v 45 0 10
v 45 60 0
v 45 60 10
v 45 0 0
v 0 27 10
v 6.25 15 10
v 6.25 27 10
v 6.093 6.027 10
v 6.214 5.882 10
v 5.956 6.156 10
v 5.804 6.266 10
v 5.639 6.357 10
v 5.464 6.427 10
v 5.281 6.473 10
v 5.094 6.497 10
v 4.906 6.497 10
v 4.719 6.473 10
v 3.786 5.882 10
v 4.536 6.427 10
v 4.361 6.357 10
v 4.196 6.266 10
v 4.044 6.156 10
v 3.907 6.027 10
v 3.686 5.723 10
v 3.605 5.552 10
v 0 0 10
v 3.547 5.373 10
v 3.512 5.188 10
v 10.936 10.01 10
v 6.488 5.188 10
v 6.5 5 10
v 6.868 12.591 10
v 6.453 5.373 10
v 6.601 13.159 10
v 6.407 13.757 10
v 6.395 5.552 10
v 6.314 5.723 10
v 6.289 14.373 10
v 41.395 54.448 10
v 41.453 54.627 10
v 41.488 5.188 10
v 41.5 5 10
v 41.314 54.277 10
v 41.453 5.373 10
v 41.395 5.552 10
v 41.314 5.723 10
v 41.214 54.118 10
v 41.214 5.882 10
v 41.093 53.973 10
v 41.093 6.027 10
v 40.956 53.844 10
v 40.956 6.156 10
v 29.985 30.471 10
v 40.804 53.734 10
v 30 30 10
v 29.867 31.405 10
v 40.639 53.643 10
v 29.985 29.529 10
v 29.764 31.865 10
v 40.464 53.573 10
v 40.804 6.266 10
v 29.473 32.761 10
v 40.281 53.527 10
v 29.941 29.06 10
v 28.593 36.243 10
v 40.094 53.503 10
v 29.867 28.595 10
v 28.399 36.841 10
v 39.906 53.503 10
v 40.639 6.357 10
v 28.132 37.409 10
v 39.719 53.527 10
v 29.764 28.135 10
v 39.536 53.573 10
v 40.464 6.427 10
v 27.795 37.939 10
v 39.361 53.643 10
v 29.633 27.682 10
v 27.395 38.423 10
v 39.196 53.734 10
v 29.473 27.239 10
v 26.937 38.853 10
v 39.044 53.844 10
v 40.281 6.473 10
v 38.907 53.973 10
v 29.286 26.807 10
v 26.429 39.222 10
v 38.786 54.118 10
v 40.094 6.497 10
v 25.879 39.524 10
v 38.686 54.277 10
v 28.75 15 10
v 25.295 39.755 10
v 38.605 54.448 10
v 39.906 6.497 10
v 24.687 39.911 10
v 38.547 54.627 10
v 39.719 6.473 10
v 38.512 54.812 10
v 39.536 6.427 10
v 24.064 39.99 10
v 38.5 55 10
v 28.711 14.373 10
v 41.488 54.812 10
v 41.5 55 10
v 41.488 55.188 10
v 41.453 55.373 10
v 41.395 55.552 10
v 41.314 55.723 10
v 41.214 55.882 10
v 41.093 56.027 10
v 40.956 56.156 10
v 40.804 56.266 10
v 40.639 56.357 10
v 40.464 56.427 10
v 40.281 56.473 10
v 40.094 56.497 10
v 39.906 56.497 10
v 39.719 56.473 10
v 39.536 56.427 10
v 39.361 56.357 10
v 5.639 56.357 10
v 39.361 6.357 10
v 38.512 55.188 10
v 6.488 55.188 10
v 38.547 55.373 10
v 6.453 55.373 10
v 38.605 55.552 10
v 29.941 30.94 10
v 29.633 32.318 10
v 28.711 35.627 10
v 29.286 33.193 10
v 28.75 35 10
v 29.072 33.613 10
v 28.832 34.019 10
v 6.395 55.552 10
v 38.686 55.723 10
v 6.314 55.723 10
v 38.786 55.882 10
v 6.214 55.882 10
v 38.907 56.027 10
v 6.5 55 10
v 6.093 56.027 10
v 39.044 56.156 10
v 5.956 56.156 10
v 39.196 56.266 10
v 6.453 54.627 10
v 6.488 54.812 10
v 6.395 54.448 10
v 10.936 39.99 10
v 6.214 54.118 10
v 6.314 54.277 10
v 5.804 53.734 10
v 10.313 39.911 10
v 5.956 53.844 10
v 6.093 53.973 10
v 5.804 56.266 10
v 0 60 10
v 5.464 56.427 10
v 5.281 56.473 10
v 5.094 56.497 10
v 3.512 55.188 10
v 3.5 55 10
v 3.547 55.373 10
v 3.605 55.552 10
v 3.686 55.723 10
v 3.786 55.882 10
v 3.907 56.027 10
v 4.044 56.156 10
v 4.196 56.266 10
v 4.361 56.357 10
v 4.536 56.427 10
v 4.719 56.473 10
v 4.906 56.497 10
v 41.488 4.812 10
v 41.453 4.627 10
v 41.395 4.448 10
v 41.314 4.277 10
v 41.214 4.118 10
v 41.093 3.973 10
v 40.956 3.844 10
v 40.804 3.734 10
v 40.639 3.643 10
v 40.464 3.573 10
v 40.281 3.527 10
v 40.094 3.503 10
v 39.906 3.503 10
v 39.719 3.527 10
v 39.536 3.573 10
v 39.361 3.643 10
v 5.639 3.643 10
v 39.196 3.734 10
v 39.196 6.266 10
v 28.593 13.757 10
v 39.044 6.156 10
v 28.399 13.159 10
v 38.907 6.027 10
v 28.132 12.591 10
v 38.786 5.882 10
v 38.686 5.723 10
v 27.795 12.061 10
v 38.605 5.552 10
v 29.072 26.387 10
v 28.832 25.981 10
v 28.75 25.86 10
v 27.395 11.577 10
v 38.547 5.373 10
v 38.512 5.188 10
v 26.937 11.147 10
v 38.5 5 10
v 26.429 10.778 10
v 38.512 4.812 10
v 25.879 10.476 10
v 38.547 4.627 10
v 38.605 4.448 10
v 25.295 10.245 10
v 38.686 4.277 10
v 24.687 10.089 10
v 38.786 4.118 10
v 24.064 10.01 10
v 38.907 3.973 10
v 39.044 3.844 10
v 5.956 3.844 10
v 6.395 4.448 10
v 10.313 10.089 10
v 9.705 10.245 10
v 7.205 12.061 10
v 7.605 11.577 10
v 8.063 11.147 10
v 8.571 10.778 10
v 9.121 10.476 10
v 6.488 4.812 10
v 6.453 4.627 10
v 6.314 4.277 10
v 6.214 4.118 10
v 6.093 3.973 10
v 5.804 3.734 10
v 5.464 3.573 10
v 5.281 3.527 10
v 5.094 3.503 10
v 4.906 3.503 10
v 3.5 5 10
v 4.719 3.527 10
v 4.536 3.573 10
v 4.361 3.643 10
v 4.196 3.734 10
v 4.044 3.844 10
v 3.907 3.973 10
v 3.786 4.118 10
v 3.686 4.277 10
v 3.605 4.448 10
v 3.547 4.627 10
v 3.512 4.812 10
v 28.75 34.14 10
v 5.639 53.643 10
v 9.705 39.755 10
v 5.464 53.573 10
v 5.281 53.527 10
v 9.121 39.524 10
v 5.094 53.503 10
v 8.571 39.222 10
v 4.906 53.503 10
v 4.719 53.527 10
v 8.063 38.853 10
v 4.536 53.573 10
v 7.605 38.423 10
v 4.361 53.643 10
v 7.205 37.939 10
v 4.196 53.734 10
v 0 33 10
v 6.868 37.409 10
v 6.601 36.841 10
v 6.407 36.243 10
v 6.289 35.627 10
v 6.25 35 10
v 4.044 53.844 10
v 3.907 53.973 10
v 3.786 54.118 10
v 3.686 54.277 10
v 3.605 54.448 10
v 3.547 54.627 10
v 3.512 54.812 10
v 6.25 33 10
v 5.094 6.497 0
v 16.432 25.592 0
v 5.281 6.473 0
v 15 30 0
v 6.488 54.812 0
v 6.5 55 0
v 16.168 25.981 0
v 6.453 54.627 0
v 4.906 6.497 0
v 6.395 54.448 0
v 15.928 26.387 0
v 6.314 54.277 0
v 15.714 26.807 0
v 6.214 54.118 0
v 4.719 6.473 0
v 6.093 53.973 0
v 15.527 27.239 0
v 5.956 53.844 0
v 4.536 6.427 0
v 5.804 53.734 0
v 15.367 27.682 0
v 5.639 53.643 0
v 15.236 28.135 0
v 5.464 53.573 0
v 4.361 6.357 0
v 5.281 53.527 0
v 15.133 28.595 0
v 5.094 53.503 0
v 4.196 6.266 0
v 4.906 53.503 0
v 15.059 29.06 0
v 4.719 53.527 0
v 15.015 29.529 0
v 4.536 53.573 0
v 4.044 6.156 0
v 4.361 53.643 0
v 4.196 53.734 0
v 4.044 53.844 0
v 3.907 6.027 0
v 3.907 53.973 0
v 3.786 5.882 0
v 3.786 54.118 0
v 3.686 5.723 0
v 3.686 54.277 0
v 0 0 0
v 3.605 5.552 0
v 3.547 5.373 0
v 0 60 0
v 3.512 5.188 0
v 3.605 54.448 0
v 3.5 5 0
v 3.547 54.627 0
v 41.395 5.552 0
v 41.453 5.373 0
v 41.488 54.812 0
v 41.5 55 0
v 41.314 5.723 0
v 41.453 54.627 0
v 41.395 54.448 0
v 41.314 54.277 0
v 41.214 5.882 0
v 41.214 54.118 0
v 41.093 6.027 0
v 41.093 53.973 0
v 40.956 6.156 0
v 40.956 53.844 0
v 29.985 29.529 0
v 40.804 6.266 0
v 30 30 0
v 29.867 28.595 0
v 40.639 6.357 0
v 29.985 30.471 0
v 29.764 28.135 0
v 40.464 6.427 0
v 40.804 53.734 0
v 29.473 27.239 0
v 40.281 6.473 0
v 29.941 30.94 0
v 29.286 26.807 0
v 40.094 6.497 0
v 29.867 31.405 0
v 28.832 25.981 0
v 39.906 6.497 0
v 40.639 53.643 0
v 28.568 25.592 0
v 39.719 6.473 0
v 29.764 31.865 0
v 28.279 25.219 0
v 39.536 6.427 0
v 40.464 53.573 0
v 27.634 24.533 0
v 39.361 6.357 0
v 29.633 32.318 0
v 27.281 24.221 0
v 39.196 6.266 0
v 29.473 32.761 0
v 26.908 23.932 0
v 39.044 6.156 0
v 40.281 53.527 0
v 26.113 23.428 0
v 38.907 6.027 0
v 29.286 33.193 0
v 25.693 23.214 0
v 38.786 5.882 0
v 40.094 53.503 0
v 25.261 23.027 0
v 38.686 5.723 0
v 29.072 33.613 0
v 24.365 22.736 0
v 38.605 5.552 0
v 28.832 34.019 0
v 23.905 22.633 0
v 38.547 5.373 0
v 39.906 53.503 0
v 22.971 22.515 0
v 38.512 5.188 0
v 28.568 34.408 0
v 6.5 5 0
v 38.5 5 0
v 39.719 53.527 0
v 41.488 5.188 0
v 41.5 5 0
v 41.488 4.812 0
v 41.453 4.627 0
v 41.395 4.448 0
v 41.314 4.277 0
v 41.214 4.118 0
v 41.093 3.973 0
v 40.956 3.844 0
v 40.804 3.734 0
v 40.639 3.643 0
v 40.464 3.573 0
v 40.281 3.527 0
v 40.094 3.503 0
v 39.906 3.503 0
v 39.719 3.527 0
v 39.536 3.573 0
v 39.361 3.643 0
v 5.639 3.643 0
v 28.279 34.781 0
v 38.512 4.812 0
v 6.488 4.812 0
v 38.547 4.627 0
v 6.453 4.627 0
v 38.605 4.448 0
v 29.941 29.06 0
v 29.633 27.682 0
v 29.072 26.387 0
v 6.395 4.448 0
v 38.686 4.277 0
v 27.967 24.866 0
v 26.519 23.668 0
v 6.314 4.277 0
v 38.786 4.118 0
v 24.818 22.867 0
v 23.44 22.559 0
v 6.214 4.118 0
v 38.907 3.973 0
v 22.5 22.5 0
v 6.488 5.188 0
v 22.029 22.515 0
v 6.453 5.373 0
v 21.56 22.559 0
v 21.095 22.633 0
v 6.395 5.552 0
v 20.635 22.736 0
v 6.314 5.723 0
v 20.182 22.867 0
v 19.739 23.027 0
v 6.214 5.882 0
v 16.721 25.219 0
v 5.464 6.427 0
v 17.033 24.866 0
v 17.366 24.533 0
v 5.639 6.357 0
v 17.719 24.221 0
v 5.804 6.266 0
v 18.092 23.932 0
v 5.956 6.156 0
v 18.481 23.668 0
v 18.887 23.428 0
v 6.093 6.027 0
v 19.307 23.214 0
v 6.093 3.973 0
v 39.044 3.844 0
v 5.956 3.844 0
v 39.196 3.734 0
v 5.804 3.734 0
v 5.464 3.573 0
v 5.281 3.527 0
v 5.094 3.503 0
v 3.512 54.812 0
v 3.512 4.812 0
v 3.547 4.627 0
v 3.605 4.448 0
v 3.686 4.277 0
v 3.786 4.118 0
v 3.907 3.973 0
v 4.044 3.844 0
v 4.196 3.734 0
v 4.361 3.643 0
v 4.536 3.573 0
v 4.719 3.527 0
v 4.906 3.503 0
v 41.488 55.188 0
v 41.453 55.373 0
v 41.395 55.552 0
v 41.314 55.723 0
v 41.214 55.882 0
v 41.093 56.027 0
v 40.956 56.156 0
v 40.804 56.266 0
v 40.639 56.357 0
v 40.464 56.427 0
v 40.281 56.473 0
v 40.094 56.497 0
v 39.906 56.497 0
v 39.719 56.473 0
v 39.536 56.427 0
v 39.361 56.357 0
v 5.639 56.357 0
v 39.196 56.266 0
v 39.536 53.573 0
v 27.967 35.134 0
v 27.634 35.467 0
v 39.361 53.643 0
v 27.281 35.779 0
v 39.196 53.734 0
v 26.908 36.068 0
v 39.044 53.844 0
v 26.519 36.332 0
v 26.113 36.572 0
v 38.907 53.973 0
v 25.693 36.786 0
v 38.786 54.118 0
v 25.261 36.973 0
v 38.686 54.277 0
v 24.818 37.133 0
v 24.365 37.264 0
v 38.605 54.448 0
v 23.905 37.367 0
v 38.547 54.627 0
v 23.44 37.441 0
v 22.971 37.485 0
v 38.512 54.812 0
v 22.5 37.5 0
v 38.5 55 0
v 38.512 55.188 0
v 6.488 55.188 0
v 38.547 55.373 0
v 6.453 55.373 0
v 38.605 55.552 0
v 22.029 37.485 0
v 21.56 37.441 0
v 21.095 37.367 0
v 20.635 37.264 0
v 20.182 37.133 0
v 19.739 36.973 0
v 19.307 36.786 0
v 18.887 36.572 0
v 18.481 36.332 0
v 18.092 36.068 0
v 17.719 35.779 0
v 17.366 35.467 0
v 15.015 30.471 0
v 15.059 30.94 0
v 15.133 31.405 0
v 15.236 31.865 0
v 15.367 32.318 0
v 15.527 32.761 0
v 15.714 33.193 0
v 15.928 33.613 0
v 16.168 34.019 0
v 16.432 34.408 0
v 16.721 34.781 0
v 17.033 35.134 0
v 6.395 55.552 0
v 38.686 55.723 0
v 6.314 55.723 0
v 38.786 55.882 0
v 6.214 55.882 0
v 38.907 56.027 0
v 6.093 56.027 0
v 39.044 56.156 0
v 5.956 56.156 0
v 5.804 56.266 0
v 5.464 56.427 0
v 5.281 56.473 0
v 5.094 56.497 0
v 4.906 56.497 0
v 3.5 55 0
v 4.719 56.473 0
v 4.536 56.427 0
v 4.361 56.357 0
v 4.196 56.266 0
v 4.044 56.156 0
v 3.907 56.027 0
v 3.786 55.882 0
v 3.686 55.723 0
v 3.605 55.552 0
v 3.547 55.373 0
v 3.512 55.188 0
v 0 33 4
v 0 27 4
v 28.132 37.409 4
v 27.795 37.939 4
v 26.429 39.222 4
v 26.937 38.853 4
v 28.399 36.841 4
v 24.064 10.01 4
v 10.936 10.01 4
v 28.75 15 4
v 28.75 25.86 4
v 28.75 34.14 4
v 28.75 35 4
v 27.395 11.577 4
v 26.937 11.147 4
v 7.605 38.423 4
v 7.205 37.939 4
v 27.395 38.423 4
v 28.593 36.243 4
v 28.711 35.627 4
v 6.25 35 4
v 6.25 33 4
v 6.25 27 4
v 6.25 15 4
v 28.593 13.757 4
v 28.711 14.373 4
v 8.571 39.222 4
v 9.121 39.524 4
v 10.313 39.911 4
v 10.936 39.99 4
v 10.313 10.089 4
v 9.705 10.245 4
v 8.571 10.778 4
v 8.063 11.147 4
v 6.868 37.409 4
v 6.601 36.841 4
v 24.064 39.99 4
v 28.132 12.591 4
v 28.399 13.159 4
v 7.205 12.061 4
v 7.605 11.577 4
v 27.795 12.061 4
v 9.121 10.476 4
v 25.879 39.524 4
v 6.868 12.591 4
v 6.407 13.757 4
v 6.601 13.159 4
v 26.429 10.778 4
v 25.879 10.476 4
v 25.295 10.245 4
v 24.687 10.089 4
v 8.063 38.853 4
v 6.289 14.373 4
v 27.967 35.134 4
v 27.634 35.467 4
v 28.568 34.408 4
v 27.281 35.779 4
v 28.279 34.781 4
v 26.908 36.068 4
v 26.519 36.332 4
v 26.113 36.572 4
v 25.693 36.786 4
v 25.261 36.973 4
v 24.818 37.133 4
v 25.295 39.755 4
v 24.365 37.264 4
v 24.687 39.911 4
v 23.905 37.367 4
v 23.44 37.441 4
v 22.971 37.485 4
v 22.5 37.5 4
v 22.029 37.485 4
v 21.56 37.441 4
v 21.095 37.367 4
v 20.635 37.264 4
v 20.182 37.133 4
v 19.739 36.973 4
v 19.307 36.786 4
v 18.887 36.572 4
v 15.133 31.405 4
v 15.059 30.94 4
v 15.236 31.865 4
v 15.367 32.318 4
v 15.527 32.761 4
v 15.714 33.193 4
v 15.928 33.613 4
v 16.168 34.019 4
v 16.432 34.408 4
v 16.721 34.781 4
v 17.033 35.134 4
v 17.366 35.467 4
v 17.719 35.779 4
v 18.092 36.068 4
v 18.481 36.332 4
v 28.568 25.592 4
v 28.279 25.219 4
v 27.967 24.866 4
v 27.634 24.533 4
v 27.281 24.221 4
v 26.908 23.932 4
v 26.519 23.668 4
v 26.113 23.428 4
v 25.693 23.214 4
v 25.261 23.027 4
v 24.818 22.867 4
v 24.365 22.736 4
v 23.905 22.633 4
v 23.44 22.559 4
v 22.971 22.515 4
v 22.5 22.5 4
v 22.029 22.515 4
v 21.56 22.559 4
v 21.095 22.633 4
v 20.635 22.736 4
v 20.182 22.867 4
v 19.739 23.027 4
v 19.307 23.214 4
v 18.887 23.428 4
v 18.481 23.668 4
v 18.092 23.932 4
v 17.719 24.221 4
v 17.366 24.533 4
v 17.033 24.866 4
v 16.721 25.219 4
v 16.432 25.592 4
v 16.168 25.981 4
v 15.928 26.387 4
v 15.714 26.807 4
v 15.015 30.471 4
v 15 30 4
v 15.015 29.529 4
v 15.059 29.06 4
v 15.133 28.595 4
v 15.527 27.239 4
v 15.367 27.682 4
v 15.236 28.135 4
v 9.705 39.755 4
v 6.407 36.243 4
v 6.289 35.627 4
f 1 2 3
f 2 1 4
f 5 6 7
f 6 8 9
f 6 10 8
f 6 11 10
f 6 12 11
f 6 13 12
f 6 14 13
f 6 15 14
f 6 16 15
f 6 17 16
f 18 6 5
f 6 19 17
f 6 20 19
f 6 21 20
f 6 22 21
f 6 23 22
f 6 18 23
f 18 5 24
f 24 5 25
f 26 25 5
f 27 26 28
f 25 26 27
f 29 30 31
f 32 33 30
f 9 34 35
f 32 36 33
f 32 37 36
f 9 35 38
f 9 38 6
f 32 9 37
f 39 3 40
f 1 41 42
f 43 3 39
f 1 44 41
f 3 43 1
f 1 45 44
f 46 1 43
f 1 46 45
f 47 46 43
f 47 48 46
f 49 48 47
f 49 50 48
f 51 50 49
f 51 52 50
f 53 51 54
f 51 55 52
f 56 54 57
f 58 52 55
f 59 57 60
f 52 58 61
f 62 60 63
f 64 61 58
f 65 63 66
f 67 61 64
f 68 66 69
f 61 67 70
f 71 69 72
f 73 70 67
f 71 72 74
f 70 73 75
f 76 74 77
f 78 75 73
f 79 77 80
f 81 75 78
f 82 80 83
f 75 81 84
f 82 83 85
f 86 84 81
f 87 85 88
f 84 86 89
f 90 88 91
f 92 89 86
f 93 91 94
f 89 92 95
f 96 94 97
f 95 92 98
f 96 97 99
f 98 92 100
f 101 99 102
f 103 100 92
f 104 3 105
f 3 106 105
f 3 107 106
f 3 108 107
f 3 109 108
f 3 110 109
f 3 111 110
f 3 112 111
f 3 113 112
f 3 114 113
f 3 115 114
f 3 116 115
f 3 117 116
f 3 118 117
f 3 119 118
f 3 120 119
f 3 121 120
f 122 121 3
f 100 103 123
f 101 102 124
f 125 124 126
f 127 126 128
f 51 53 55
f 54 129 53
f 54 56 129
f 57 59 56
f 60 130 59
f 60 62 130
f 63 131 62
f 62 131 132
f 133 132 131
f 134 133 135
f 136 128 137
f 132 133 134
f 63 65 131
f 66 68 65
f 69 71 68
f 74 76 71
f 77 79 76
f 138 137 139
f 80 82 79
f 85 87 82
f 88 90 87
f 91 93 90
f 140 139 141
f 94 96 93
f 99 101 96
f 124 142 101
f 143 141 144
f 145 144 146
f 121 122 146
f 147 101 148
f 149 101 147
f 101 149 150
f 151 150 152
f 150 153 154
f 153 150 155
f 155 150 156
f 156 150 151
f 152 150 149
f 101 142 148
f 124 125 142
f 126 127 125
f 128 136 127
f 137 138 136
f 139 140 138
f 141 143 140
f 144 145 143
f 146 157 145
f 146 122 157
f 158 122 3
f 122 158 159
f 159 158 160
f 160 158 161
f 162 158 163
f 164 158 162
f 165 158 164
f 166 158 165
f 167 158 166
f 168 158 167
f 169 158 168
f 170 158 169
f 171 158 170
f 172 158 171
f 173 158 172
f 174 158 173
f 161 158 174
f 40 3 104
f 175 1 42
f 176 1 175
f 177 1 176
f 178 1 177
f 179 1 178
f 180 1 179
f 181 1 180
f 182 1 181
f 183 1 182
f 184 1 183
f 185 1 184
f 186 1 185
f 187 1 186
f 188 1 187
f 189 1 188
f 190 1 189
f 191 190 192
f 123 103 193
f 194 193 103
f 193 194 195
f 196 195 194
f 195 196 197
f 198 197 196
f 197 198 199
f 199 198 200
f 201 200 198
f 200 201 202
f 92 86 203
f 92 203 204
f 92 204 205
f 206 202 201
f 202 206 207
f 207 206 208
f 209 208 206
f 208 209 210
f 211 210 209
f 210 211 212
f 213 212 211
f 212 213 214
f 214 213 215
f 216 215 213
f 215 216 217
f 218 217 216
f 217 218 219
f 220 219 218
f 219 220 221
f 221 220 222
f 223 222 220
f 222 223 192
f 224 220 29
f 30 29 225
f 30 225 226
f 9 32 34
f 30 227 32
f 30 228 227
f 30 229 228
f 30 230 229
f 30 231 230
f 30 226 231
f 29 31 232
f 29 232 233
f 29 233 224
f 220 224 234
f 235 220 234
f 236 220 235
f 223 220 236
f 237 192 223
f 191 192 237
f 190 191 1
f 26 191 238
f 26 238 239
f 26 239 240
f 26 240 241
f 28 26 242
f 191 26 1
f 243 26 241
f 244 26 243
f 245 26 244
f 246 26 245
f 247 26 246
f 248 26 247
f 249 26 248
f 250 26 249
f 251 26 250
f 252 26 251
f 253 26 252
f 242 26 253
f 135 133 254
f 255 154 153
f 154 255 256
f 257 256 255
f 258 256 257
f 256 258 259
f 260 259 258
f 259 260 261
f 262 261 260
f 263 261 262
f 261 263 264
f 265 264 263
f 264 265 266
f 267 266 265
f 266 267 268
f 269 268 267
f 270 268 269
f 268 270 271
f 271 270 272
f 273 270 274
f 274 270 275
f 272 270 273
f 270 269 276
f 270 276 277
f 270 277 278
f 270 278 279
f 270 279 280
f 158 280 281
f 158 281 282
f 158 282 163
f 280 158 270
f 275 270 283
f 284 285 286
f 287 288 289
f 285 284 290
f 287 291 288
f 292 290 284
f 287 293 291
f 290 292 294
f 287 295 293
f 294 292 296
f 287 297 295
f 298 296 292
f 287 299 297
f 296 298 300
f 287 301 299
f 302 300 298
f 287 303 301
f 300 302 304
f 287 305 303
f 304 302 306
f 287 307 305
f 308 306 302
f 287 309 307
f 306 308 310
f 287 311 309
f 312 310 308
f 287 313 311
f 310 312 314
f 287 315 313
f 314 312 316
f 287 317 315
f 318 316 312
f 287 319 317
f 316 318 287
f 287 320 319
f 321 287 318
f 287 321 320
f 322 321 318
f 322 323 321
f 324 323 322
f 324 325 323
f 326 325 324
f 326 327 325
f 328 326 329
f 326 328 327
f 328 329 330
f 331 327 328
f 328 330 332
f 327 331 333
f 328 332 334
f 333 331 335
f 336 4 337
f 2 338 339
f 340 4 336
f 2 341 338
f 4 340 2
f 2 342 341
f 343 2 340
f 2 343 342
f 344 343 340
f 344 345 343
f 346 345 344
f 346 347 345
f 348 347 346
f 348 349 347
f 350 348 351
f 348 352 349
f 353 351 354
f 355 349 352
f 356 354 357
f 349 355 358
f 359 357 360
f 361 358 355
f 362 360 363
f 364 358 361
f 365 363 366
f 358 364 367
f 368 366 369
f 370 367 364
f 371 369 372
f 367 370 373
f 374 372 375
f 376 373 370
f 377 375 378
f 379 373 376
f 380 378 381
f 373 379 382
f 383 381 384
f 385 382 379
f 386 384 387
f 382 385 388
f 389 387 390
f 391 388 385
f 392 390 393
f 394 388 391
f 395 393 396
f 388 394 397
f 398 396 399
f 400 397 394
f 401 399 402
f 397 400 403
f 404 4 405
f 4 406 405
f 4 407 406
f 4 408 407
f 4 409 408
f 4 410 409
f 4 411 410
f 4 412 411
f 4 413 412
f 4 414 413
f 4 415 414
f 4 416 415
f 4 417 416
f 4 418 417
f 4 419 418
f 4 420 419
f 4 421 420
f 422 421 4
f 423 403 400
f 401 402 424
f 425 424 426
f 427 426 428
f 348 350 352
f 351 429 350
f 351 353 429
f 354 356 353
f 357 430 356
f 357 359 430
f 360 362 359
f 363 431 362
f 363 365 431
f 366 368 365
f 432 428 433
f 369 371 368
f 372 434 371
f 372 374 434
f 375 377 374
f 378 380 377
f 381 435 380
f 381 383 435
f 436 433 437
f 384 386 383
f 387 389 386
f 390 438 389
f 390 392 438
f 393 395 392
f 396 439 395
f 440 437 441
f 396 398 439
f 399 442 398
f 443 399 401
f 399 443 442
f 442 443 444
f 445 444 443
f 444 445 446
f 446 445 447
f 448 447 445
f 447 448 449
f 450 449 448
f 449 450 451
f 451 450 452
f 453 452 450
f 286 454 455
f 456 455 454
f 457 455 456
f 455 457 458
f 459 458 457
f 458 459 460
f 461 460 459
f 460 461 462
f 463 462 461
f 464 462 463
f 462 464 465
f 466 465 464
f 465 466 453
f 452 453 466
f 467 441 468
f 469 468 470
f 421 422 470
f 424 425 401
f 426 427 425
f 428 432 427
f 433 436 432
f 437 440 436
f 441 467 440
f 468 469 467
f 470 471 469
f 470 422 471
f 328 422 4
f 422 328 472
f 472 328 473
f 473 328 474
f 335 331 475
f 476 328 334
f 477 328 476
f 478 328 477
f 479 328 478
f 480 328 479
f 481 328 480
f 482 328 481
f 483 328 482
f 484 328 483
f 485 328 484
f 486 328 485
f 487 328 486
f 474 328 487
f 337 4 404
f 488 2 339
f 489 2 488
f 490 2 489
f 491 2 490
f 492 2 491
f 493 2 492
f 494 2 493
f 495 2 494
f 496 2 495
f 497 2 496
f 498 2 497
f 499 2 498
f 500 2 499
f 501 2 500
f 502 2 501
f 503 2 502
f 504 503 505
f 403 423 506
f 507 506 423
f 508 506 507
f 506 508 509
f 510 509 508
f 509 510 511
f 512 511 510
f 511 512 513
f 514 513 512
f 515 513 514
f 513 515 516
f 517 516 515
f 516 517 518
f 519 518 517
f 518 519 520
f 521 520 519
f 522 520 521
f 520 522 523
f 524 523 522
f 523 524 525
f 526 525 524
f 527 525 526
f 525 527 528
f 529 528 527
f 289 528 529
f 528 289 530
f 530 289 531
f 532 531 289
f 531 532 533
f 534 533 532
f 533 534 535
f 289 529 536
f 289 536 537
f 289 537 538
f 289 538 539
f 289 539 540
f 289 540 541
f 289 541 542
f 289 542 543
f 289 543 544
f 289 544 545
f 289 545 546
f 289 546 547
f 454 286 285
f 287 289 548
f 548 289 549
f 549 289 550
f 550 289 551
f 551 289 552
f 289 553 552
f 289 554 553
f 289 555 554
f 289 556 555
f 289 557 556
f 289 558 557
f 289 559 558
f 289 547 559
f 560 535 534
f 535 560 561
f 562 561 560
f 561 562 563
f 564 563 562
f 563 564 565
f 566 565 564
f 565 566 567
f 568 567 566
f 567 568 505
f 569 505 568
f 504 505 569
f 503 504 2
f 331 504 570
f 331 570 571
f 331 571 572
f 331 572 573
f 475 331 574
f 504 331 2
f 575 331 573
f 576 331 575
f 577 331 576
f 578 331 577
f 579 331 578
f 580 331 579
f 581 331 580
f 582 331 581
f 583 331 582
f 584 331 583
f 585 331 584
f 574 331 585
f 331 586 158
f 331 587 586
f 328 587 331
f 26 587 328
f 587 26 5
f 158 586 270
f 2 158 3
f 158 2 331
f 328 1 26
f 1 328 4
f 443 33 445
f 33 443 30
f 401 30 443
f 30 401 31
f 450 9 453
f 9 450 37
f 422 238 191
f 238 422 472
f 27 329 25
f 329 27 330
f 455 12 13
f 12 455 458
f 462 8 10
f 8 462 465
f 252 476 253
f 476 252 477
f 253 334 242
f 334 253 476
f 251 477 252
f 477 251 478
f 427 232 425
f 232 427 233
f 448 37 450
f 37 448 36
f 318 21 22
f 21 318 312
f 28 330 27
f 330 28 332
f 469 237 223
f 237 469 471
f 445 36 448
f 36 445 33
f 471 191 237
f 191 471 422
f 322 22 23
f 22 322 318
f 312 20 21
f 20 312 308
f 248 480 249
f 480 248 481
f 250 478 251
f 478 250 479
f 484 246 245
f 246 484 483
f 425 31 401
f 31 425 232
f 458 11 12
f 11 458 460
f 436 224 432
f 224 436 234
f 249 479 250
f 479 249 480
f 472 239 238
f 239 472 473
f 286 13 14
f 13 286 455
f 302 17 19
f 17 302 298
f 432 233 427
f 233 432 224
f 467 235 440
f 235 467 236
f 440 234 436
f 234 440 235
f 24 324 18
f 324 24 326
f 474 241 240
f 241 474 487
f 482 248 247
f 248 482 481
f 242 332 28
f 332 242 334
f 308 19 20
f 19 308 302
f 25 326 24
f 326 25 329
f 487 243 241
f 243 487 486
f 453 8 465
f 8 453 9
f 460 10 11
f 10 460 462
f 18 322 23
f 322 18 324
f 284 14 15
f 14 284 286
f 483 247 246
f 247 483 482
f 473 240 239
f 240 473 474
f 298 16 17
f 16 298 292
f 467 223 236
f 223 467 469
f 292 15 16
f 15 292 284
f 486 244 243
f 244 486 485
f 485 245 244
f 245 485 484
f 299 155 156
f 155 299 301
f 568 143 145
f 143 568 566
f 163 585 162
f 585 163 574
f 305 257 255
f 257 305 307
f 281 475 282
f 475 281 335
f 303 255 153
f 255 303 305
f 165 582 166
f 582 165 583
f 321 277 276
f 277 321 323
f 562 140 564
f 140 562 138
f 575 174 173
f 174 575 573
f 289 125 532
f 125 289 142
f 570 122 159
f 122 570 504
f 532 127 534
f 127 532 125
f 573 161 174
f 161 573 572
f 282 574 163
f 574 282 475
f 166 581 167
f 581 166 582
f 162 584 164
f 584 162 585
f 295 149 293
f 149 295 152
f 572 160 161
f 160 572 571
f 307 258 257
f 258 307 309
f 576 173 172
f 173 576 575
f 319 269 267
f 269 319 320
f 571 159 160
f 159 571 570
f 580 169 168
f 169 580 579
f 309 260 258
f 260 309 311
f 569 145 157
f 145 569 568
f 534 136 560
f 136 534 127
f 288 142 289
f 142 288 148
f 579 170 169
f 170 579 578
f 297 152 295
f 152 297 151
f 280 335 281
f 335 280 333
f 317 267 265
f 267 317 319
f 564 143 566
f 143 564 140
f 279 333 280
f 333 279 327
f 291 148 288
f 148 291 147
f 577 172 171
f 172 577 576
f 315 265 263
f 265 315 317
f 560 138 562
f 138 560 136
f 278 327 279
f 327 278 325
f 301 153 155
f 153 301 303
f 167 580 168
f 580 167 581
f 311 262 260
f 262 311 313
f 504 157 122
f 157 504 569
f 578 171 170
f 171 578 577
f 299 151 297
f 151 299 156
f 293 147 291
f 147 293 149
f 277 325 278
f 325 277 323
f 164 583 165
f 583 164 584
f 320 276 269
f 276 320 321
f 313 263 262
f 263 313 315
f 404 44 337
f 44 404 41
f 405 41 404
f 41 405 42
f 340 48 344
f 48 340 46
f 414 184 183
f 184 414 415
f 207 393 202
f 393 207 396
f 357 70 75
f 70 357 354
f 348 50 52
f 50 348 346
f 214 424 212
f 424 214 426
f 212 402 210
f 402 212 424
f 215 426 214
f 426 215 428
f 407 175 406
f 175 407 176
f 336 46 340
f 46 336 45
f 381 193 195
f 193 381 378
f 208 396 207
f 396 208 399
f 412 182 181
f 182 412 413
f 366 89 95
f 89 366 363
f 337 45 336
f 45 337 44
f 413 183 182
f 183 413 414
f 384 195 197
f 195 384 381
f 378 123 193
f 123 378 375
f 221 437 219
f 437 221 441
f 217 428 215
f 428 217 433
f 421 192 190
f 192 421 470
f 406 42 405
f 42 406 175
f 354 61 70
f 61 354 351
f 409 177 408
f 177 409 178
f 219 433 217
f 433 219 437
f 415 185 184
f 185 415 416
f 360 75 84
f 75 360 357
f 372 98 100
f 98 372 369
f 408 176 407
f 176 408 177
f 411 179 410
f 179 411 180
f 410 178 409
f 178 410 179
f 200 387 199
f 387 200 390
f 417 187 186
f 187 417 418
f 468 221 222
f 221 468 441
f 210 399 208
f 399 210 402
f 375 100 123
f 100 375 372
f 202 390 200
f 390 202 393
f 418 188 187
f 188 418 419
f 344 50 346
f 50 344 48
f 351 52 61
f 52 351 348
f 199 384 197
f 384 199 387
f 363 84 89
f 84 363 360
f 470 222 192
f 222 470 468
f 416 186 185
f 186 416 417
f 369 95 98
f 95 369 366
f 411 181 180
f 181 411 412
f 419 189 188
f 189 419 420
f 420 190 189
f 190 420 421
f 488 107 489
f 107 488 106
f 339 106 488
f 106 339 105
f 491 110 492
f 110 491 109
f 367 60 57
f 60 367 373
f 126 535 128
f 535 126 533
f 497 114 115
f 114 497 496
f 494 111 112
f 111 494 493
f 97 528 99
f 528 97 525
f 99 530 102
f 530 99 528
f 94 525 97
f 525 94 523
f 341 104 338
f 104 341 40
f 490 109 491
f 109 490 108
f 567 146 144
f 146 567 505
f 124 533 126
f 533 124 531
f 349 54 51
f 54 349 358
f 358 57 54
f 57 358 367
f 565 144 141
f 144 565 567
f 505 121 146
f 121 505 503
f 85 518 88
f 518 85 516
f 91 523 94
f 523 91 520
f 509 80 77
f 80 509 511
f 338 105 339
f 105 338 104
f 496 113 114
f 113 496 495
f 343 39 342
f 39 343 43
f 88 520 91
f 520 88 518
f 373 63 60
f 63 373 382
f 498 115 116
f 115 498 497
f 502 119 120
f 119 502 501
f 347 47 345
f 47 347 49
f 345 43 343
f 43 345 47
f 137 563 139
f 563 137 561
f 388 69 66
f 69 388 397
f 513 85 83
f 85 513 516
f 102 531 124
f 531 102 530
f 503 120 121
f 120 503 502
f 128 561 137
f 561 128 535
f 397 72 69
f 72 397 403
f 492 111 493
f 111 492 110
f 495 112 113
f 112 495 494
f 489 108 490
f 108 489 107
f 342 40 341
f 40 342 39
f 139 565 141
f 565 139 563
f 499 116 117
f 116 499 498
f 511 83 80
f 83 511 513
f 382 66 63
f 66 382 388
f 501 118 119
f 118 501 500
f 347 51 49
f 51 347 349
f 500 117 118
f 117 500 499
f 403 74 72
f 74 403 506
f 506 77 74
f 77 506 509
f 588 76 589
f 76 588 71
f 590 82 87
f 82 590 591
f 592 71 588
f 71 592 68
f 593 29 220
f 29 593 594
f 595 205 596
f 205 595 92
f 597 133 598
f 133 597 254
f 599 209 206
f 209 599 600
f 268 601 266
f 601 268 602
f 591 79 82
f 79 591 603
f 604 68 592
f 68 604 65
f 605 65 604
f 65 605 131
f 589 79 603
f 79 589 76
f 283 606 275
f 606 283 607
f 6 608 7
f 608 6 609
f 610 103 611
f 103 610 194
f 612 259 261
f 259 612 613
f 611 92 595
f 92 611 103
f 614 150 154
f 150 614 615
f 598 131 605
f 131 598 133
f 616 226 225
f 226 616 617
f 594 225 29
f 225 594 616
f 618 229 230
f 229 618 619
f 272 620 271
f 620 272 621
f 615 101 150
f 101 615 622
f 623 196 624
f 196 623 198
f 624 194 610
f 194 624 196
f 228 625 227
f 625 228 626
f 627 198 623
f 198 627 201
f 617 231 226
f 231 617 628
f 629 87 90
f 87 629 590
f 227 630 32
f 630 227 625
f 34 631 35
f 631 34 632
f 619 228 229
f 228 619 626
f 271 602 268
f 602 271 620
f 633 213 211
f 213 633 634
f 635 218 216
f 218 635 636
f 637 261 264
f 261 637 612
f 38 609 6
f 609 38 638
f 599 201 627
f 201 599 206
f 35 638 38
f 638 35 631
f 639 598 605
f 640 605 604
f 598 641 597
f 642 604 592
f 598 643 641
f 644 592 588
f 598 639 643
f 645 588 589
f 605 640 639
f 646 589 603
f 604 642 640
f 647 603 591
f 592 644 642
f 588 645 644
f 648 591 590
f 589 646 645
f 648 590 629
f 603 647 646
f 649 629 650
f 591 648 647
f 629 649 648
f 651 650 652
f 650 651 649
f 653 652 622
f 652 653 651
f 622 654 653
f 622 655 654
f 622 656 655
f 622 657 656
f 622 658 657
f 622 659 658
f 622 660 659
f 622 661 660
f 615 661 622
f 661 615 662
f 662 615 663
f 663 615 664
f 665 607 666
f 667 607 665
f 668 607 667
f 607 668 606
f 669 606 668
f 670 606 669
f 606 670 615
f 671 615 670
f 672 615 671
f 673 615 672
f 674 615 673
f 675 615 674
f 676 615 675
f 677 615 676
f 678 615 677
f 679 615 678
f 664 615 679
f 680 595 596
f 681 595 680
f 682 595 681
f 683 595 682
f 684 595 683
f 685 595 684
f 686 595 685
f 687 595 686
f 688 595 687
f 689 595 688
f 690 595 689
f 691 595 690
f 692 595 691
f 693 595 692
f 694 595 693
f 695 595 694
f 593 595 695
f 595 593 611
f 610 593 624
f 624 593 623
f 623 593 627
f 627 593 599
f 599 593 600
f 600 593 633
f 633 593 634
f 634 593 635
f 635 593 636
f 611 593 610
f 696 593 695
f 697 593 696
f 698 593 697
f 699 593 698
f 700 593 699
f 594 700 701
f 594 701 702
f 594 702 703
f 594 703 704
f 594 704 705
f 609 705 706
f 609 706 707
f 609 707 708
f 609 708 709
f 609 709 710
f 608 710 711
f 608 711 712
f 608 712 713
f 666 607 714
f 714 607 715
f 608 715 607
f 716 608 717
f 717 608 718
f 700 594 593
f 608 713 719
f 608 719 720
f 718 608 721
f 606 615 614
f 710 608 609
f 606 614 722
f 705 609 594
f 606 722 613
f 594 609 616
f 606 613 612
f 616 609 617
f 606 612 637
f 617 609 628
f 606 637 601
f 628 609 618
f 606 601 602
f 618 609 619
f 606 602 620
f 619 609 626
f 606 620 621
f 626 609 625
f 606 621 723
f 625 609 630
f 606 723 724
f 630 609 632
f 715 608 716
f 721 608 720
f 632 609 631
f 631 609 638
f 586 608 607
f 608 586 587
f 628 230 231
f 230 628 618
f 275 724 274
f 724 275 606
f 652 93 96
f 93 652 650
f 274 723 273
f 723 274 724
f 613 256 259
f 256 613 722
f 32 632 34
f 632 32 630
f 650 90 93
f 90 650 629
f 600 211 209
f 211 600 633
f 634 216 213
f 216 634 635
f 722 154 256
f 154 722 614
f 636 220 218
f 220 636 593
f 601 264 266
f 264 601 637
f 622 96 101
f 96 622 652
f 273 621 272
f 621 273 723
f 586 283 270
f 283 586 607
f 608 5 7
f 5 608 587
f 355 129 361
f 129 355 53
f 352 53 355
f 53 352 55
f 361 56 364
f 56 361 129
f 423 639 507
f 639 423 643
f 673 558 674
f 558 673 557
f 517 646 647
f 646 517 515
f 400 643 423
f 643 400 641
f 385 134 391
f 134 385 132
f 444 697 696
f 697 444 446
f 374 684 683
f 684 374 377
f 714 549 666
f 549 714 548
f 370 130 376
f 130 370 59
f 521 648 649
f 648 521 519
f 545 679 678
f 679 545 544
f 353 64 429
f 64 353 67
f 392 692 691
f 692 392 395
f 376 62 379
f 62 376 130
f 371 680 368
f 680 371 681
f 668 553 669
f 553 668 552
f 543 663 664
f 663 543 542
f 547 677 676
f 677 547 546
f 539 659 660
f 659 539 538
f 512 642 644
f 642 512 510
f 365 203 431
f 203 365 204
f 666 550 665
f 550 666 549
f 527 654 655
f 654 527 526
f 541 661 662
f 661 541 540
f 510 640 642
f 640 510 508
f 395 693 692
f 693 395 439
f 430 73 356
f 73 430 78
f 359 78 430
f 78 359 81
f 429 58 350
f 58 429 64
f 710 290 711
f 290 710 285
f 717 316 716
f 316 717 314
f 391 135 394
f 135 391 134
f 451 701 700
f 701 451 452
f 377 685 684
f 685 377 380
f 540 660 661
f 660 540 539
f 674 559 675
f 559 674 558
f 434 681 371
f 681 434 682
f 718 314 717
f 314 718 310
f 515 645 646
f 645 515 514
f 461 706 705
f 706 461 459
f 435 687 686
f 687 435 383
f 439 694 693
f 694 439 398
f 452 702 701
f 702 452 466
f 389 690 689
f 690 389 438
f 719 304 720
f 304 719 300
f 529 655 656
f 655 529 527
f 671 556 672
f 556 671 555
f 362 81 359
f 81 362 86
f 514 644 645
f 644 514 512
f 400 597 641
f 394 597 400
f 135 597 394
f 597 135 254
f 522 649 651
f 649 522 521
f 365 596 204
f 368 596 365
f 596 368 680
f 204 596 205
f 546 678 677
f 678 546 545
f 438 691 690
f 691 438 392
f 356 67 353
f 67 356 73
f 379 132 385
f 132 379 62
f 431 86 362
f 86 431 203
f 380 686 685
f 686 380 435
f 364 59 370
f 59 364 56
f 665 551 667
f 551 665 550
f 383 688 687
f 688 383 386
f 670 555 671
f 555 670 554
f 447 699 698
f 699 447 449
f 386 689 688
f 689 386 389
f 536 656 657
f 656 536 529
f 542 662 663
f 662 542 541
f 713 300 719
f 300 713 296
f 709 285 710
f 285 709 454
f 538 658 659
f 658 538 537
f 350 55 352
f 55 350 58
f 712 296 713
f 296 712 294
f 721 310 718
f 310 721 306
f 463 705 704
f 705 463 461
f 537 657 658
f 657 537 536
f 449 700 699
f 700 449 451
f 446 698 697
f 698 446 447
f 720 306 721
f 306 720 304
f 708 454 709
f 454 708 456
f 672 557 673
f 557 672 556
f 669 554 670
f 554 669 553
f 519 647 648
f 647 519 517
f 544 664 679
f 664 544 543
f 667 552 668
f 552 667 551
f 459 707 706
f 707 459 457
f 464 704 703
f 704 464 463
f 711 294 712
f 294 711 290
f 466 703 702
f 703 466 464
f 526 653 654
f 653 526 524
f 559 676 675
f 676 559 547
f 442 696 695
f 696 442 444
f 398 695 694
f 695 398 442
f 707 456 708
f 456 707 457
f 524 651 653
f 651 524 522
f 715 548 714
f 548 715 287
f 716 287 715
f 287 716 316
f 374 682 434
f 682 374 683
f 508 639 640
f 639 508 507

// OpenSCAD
// OpenSCAD script for a milled plate model

// Main model: start with a 45x60x10mm plate and subtract the holes, pocket, slot, and center through‐hole
difference() {
  
  // 1. Create the main plate (cube from (0,0,0) to (45,60,10))
  cube([45,60,10]);
  
  // 2. Subtract 4 corner holes (3mm diameter, full-through holes)
// Each hole is centered 5mm from the adjacent edges.
// The cylinder is given extra height (12mm) and lowered slightly in Z to ensure it cuts through.
  translate([5,5,-1])
    cylinder(d=3, h=12, $fn=50);
    
  translate([5,55,-1])
    cylinder(d=3, h=12, $fn=50);
    
  translate([40,5,-1])
    cylinder(d=3, h=12, $fn=50);
    
  translate([40,55,-1])
    cylinder(d=3, h=12, $fn=50);
  
  // 3. Subtract the rectangular pocket with rounded corners
// Pocket dimensions: 22.5mm x 30mm in XY with 5mm radius corners,
// cut from the top surface down 6mm (leaving a 4mm bottom).
// The pocket is exactly centered in the plate.
// Build the 2D pocket shape using minkowski sum (a square plus a circle for fillets)
// The inner square is chosen with dimensions reduced by twice the fillet radius.
  translate([0,0,4])  // Position the pocket so that it spans z from 4mm to 10mm
    linear_extrude(height=6)
      // Translate the 2D pocket shape to its XY location (centered in the 45x60 plate)
      translate([11.25,15])
        minkowski() {
          // The inner square: dimensions chosen so that after adding fillets the overall
          // width becomes 12.5+10 = 22.5mm and height 20+10 = 30mm.
          square([12.5,20], center=false);
          // Circle for rounded corners with radius 5mm
          circle(r=5, $fn=50);
        }
        
  // 4. Subtract the slot from the outside of the plate to the pocket
// The slot is 6mm wide (in Y), parallel to X axis, with a depth of 6mm (z from 4mm to 10mm).
// It connects the left edge of the plate (x=0) to the left side of the pocket (x=11.25).
// The slot is centered vertically (Y center = 30, so Y from 27 to 33).
  translate([0,27,4])
    cube([11.25,6,6]);
    
  // 5. Subtract a 15mm diameter through hole at the center of the plate.
// The center of the plate is at (22.5,30) in XY. The cylinder extends sufficiently in Z.
  translate([22.5,30,-1])
    cylinder(d=15, h=12, $fn=100);
}
